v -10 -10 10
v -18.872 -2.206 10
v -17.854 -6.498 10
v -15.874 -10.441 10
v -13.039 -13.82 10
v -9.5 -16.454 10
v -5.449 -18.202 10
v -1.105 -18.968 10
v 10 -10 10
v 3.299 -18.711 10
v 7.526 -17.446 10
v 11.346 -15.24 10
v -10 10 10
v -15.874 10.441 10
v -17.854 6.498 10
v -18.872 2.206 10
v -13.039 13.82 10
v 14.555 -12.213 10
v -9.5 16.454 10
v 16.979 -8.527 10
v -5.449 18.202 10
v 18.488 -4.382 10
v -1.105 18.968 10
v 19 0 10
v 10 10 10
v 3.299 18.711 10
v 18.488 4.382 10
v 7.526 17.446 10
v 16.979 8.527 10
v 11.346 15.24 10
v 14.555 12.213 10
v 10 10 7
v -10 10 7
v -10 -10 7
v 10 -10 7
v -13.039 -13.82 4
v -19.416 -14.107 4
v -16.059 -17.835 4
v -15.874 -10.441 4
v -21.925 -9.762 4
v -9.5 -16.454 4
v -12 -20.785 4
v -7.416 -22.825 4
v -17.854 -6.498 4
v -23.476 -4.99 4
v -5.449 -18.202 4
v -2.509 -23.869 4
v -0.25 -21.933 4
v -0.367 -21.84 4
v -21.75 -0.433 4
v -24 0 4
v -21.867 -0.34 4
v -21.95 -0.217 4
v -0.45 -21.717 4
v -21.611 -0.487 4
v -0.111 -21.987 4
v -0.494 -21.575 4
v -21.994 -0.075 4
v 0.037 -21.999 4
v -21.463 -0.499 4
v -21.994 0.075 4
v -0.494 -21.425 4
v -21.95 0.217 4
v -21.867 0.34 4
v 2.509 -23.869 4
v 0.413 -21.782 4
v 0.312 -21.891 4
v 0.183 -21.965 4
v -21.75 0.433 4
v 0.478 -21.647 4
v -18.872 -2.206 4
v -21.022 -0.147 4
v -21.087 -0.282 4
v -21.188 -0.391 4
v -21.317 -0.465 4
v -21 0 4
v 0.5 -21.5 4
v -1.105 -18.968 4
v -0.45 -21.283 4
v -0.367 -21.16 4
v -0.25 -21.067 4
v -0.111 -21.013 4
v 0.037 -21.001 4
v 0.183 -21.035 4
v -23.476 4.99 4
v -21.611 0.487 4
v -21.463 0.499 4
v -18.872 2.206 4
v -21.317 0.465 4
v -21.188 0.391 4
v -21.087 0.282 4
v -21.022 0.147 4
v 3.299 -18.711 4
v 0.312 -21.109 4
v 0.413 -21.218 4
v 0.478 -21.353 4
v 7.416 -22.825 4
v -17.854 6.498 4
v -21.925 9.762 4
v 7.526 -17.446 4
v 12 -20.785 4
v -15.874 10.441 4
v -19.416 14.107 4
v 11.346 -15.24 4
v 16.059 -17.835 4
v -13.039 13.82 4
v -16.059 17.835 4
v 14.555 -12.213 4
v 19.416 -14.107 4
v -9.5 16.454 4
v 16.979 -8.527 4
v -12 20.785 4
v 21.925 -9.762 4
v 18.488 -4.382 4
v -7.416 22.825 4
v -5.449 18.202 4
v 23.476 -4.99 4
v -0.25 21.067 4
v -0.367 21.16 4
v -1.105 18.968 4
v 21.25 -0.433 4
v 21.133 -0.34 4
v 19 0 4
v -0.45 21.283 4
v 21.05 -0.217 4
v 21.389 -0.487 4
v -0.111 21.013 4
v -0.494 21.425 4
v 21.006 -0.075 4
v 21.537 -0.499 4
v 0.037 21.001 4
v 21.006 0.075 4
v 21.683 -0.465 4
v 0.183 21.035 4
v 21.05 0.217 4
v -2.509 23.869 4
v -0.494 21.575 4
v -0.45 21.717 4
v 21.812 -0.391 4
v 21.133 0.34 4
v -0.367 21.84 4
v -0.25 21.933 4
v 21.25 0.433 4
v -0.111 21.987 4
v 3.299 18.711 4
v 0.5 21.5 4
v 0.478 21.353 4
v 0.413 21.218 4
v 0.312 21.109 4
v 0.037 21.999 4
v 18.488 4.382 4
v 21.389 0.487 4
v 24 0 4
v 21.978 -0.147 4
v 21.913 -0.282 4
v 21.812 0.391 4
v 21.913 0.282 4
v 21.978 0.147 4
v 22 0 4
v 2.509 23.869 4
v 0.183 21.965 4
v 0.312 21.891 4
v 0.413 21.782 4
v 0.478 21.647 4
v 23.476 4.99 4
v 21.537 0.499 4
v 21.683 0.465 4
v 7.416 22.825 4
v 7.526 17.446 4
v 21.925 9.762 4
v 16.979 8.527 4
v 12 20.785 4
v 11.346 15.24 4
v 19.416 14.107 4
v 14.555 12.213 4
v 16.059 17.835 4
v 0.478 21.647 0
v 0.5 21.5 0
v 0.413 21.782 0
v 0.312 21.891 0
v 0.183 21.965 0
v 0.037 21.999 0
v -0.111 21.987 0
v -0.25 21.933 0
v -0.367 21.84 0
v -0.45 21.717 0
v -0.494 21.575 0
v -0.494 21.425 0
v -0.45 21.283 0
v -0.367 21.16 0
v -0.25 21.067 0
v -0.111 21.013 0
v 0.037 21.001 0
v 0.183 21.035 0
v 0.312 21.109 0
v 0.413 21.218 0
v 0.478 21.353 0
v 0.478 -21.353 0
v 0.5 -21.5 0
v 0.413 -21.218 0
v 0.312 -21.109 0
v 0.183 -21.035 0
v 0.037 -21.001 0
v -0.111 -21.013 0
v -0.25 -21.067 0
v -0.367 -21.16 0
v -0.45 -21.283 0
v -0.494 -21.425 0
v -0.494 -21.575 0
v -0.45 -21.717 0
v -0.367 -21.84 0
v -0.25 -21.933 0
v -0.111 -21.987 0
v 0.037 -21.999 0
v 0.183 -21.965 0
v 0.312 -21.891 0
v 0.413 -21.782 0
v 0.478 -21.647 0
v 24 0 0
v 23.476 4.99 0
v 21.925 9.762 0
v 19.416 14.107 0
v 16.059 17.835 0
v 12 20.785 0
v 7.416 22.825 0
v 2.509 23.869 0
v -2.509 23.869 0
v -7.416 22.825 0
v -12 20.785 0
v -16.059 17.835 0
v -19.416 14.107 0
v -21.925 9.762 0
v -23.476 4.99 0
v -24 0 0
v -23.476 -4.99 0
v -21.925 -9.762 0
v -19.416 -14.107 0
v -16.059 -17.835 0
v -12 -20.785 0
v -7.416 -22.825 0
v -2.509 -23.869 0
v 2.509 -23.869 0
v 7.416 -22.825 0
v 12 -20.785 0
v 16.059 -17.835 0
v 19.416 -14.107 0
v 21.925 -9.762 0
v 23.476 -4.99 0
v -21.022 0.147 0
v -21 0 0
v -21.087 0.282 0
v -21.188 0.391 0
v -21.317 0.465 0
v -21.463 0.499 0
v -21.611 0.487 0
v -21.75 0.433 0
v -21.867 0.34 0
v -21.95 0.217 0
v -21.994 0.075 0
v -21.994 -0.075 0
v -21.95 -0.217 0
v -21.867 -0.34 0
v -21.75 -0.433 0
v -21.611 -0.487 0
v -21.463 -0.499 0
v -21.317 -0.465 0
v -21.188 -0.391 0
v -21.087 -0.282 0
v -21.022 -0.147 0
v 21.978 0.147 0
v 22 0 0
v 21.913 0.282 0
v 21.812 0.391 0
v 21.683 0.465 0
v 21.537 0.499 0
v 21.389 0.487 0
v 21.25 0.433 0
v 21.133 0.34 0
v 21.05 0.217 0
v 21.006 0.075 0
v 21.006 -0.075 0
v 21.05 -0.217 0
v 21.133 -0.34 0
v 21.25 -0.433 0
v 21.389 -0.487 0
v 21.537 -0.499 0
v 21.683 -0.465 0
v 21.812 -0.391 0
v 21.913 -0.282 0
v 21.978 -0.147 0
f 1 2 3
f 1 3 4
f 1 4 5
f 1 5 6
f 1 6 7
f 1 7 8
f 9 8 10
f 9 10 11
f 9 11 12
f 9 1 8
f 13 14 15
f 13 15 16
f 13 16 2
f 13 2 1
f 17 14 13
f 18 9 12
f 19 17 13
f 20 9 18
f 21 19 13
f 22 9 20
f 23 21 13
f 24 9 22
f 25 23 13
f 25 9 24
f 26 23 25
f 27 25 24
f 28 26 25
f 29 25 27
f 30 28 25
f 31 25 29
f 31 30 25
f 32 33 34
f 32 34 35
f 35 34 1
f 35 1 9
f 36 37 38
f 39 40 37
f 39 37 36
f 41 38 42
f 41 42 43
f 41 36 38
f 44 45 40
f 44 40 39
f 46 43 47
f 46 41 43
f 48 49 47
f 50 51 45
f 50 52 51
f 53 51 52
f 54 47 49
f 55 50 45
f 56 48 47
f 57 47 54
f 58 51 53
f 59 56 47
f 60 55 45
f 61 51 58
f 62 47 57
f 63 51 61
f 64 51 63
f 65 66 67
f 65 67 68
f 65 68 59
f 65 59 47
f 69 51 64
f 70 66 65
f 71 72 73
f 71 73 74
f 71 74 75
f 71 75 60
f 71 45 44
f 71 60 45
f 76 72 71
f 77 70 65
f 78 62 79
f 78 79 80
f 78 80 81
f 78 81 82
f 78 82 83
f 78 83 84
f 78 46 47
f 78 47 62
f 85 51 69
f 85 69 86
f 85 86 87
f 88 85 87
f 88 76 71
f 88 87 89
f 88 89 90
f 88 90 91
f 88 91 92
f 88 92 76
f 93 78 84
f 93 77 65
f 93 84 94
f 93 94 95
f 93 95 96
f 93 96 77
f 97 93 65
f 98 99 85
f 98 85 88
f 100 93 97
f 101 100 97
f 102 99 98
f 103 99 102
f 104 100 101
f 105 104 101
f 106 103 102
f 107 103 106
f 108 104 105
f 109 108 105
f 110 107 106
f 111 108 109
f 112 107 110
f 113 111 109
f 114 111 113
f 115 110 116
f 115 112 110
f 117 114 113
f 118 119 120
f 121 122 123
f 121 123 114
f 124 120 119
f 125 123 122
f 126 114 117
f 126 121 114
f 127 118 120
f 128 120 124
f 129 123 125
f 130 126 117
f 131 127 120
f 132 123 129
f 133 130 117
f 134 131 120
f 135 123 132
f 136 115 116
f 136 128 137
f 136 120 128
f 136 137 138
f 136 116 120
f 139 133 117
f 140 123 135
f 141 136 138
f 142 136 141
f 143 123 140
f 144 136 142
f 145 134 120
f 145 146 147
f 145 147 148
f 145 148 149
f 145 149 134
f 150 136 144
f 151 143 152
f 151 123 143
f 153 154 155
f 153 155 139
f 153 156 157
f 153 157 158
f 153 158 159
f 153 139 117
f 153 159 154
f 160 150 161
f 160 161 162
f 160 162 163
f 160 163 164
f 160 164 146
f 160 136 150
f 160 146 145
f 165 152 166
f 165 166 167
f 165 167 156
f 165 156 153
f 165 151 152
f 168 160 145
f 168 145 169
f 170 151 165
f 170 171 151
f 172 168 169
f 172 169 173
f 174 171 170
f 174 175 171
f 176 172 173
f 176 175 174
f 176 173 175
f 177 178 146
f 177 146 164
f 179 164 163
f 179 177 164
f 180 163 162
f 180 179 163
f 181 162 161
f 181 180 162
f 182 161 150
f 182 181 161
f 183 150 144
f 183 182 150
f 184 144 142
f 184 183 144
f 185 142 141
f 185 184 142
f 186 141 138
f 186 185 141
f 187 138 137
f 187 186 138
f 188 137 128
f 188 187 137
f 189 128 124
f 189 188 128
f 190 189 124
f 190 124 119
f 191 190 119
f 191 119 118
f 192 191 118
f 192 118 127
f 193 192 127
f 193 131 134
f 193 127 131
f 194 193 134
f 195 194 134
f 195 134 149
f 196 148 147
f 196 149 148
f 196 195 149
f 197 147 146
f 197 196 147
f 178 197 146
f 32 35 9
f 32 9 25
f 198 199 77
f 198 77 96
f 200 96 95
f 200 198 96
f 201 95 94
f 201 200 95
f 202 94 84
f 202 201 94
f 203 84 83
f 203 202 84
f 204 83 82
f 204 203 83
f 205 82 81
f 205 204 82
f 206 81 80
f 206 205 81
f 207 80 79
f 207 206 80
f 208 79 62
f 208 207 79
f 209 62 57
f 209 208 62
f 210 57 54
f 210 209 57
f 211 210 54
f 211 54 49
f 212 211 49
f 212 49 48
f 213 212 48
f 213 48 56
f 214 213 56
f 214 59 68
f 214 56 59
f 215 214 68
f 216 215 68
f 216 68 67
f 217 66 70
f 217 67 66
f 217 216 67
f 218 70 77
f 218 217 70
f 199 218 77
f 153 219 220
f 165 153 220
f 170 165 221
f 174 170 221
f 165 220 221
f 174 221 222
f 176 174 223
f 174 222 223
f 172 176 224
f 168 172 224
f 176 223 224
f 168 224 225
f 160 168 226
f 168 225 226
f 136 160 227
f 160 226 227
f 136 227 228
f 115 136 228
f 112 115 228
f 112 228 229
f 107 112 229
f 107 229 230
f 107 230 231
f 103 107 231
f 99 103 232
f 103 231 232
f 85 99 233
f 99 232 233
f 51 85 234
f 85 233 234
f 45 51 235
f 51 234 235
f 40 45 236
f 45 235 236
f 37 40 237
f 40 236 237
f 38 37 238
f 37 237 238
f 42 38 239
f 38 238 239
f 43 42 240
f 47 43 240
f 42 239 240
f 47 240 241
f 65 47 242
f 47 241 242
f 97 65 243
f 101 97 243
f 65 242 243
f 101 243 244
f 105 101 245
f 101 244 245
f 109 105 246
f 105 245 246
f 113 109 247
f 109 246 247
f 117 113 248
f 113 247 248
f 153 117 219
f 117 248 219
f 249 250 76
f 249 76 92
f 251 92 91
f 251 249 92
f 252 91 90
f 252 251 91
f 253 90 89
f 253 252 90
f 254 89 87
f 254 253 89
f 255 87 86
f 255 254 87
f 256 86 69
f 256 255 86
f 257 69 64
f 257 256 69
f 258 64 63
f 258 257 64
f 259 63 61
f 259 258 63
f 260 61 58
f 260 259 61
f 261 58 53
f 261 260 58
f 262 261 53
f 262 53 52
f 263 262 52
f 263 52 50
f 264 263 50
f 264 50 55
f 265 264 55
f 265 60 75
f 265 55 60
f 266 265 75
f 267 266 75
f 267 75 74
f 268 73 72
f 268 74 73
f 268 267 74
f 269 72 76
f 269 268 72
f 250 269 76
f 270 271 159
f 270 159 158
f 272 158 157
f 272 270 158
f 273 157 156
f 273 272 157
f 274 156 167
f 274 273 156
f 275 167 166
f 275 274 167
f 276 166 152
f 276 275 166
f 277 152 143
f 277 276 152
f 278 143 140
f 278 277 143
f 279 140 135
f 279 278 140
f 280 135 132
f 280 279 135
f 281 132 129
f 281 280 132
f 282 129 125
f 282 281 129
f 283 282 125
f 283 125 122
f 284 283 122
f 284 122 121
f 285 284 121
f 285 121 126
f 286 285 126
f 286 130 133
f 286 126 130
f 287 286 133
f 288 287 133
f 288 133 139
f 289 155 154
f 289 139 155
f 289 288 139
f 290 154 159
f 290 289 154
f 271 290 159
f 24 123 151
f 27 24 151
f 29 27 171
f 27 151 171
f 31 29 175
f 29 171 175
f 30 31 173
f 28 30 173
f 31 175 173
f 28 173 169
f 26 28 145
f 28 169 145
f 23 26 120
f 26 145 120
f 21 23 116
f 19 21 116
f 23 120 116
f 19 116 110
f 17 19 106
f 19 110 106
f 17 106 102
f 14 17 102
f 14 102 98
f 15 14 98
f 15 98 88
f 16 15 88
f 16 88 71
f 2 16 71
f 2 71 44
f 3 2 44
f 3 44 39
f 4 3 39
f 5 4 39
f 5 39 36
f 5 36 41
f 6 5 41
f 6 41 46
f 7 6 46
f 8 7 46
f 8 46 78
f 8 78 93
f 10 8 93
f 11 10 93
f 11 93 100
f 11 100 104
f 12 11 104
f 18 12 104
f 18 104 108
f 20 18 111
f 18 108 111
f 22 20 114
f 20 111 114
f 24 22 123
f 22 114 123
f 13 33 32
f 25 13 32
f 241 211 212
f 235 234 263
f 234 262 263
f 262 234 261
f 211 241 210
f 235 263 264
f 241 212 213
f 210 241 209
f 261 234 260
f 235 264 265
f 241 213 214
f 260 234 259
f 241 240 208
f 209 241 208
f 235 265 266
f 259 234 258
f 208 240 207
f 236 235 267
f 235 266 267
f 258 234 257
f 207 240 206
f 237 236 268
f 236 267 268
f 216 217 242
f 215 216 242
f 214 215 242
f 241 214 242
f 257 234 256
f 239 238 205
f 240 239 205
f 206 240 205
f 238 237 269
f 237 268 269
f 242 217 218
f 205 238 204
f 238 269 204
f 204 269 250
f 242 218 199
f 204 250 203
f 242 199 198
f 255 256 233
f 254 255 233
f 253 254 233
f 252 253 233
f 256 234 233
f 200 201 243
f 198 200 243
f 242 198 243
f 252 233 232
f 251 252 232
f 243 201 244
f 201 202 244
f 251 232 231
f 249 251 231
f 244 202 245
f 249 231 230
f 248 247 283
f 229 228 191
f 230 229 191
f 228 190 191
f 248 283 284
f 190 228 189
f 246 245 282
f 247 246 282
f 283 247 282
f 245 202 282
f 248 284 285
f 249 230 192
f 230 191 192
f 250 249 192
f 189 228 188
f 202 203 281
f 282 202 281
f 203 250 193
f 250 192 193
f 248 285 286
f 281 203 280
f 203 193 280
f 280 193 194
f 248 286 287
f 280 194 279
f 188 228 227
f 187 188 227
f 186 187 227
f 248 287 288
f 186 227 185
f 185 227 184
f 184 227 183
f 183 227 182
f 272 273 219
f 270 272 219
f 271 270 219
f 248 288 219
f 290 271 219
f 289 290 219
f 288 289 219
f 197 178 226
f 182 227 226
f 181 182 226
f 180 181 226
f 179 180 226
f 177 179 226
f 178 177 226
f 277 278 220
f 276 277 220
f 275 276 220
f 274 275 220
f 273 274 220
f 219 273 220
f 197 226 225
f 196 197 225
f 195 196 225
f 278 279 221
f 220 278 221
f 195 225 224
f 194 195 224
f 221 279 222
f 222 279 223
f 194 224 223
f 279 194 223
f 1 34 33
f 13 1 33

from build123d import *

# Parameters (mm, degrees)
BOX_W             = 20
BOX_H             = 20
BOX_DEPTH         = 20
CIRCLE001_R       = 19
EXTRUDE001_DEPTH  = 10
CYLINDER001_R     = 0.5
CYLINDER001_DEPTH = 10
CYLINDER002_R     = 0.5
CYLINDER002_DEPTH = 10
CYLINDER003_R     = 0.5
CYLINDER003_DEPTH = 10
CYLINDER_R        = 0.5
CYLINDER_DEPTH    = 10
CIRCLE_R          = 24
EXTRUDE_DEPTH     = 4


with BuildPart() as cube:
    # Box → Box (new body)
    with BuildSketch(Plane(origin=(-10, -10, 7), x_dir=(1, 0, 0), z_dir=(0, 0, 1))):
        with Locations((10, 10)):
            Rectangle(BOX_W, BOX_H)
    extrude(amount=BOX_DEPTH)


with BuildPart() as extrude001:
    # Circle001 → Extrude001 (new body)
    with BuildSketch(Plane.XY):
        Circle(CIRCLE001_R)
    extrude(amount=EXTRUDE001_DEPTH)


with BuildPart() as cylinder001:
    # Cylinder001 → Cylinder001 (new body)
    with BuildSketch(Plane(origin=(-21.5, 0, -3), x_dir=(1, 0, 0), z_dir=(0, 0, 1))):
        Circle(CYLINDER001_R)
    extrude(amount=CYLINDER001_DEPTH)


with BuildPart() as cylinder002:
    # Cylinder002 → Cylinder002 (new body)
    with BuildSketch(Plane(origin=(0, 21.5, -3), x_dir=(1, 0, 0), z_dir=(0, 0, 1))):
        Circle(CYLINDER002_R)
    extrude(amount=CYLINDER002_DEPTH)


with BuildPart() as cylinder003:
    # Cylinder003 → Cylinder003 (new body)
    with BuildSketch(Plane(origin=(0, -21.5, -3), x_dir=(1, 0, 0), z_dir=(0, 0, 1))):
        Circle(CYLINDER003_R)
    extrude(amount=CYLINDER003_DEPTH)


with BuildPart() as fusion:
    # Cylinder → Cylinder (new body)
    with BuildSketch(Plane(origin=(21.5, 0, -3), x_dir=(1, 0, 0), z_dir=(0, 0, 1))):
        Circle(CYLINDER_R)
    extrude(amount=CYLINDER_DEPTH)

    # Fusion: union Cylinder001, Cylinder002, Cylinder003
    add(cylinder001.part)
    add(cylinder002.part)
    add(cylinder003.part)


with BuildPart() as cut001:
    # Circle → Extrude (new body)
    with BuildSketch(Plane.XY):
        Circle(CIRCLE_R)
    extrude(amount=EXTRUDE_DEPTH)

    # Cut: cut Fusion
    add(fusion.part, mode=Mode.SUBTRACT)

    # Fusion001: union Extrude001
    add(extrude001.part)

    # Cut001: cut Cube
    add(cube.part, mode=Mode.SUBTRACT)


solid = cut001.part
